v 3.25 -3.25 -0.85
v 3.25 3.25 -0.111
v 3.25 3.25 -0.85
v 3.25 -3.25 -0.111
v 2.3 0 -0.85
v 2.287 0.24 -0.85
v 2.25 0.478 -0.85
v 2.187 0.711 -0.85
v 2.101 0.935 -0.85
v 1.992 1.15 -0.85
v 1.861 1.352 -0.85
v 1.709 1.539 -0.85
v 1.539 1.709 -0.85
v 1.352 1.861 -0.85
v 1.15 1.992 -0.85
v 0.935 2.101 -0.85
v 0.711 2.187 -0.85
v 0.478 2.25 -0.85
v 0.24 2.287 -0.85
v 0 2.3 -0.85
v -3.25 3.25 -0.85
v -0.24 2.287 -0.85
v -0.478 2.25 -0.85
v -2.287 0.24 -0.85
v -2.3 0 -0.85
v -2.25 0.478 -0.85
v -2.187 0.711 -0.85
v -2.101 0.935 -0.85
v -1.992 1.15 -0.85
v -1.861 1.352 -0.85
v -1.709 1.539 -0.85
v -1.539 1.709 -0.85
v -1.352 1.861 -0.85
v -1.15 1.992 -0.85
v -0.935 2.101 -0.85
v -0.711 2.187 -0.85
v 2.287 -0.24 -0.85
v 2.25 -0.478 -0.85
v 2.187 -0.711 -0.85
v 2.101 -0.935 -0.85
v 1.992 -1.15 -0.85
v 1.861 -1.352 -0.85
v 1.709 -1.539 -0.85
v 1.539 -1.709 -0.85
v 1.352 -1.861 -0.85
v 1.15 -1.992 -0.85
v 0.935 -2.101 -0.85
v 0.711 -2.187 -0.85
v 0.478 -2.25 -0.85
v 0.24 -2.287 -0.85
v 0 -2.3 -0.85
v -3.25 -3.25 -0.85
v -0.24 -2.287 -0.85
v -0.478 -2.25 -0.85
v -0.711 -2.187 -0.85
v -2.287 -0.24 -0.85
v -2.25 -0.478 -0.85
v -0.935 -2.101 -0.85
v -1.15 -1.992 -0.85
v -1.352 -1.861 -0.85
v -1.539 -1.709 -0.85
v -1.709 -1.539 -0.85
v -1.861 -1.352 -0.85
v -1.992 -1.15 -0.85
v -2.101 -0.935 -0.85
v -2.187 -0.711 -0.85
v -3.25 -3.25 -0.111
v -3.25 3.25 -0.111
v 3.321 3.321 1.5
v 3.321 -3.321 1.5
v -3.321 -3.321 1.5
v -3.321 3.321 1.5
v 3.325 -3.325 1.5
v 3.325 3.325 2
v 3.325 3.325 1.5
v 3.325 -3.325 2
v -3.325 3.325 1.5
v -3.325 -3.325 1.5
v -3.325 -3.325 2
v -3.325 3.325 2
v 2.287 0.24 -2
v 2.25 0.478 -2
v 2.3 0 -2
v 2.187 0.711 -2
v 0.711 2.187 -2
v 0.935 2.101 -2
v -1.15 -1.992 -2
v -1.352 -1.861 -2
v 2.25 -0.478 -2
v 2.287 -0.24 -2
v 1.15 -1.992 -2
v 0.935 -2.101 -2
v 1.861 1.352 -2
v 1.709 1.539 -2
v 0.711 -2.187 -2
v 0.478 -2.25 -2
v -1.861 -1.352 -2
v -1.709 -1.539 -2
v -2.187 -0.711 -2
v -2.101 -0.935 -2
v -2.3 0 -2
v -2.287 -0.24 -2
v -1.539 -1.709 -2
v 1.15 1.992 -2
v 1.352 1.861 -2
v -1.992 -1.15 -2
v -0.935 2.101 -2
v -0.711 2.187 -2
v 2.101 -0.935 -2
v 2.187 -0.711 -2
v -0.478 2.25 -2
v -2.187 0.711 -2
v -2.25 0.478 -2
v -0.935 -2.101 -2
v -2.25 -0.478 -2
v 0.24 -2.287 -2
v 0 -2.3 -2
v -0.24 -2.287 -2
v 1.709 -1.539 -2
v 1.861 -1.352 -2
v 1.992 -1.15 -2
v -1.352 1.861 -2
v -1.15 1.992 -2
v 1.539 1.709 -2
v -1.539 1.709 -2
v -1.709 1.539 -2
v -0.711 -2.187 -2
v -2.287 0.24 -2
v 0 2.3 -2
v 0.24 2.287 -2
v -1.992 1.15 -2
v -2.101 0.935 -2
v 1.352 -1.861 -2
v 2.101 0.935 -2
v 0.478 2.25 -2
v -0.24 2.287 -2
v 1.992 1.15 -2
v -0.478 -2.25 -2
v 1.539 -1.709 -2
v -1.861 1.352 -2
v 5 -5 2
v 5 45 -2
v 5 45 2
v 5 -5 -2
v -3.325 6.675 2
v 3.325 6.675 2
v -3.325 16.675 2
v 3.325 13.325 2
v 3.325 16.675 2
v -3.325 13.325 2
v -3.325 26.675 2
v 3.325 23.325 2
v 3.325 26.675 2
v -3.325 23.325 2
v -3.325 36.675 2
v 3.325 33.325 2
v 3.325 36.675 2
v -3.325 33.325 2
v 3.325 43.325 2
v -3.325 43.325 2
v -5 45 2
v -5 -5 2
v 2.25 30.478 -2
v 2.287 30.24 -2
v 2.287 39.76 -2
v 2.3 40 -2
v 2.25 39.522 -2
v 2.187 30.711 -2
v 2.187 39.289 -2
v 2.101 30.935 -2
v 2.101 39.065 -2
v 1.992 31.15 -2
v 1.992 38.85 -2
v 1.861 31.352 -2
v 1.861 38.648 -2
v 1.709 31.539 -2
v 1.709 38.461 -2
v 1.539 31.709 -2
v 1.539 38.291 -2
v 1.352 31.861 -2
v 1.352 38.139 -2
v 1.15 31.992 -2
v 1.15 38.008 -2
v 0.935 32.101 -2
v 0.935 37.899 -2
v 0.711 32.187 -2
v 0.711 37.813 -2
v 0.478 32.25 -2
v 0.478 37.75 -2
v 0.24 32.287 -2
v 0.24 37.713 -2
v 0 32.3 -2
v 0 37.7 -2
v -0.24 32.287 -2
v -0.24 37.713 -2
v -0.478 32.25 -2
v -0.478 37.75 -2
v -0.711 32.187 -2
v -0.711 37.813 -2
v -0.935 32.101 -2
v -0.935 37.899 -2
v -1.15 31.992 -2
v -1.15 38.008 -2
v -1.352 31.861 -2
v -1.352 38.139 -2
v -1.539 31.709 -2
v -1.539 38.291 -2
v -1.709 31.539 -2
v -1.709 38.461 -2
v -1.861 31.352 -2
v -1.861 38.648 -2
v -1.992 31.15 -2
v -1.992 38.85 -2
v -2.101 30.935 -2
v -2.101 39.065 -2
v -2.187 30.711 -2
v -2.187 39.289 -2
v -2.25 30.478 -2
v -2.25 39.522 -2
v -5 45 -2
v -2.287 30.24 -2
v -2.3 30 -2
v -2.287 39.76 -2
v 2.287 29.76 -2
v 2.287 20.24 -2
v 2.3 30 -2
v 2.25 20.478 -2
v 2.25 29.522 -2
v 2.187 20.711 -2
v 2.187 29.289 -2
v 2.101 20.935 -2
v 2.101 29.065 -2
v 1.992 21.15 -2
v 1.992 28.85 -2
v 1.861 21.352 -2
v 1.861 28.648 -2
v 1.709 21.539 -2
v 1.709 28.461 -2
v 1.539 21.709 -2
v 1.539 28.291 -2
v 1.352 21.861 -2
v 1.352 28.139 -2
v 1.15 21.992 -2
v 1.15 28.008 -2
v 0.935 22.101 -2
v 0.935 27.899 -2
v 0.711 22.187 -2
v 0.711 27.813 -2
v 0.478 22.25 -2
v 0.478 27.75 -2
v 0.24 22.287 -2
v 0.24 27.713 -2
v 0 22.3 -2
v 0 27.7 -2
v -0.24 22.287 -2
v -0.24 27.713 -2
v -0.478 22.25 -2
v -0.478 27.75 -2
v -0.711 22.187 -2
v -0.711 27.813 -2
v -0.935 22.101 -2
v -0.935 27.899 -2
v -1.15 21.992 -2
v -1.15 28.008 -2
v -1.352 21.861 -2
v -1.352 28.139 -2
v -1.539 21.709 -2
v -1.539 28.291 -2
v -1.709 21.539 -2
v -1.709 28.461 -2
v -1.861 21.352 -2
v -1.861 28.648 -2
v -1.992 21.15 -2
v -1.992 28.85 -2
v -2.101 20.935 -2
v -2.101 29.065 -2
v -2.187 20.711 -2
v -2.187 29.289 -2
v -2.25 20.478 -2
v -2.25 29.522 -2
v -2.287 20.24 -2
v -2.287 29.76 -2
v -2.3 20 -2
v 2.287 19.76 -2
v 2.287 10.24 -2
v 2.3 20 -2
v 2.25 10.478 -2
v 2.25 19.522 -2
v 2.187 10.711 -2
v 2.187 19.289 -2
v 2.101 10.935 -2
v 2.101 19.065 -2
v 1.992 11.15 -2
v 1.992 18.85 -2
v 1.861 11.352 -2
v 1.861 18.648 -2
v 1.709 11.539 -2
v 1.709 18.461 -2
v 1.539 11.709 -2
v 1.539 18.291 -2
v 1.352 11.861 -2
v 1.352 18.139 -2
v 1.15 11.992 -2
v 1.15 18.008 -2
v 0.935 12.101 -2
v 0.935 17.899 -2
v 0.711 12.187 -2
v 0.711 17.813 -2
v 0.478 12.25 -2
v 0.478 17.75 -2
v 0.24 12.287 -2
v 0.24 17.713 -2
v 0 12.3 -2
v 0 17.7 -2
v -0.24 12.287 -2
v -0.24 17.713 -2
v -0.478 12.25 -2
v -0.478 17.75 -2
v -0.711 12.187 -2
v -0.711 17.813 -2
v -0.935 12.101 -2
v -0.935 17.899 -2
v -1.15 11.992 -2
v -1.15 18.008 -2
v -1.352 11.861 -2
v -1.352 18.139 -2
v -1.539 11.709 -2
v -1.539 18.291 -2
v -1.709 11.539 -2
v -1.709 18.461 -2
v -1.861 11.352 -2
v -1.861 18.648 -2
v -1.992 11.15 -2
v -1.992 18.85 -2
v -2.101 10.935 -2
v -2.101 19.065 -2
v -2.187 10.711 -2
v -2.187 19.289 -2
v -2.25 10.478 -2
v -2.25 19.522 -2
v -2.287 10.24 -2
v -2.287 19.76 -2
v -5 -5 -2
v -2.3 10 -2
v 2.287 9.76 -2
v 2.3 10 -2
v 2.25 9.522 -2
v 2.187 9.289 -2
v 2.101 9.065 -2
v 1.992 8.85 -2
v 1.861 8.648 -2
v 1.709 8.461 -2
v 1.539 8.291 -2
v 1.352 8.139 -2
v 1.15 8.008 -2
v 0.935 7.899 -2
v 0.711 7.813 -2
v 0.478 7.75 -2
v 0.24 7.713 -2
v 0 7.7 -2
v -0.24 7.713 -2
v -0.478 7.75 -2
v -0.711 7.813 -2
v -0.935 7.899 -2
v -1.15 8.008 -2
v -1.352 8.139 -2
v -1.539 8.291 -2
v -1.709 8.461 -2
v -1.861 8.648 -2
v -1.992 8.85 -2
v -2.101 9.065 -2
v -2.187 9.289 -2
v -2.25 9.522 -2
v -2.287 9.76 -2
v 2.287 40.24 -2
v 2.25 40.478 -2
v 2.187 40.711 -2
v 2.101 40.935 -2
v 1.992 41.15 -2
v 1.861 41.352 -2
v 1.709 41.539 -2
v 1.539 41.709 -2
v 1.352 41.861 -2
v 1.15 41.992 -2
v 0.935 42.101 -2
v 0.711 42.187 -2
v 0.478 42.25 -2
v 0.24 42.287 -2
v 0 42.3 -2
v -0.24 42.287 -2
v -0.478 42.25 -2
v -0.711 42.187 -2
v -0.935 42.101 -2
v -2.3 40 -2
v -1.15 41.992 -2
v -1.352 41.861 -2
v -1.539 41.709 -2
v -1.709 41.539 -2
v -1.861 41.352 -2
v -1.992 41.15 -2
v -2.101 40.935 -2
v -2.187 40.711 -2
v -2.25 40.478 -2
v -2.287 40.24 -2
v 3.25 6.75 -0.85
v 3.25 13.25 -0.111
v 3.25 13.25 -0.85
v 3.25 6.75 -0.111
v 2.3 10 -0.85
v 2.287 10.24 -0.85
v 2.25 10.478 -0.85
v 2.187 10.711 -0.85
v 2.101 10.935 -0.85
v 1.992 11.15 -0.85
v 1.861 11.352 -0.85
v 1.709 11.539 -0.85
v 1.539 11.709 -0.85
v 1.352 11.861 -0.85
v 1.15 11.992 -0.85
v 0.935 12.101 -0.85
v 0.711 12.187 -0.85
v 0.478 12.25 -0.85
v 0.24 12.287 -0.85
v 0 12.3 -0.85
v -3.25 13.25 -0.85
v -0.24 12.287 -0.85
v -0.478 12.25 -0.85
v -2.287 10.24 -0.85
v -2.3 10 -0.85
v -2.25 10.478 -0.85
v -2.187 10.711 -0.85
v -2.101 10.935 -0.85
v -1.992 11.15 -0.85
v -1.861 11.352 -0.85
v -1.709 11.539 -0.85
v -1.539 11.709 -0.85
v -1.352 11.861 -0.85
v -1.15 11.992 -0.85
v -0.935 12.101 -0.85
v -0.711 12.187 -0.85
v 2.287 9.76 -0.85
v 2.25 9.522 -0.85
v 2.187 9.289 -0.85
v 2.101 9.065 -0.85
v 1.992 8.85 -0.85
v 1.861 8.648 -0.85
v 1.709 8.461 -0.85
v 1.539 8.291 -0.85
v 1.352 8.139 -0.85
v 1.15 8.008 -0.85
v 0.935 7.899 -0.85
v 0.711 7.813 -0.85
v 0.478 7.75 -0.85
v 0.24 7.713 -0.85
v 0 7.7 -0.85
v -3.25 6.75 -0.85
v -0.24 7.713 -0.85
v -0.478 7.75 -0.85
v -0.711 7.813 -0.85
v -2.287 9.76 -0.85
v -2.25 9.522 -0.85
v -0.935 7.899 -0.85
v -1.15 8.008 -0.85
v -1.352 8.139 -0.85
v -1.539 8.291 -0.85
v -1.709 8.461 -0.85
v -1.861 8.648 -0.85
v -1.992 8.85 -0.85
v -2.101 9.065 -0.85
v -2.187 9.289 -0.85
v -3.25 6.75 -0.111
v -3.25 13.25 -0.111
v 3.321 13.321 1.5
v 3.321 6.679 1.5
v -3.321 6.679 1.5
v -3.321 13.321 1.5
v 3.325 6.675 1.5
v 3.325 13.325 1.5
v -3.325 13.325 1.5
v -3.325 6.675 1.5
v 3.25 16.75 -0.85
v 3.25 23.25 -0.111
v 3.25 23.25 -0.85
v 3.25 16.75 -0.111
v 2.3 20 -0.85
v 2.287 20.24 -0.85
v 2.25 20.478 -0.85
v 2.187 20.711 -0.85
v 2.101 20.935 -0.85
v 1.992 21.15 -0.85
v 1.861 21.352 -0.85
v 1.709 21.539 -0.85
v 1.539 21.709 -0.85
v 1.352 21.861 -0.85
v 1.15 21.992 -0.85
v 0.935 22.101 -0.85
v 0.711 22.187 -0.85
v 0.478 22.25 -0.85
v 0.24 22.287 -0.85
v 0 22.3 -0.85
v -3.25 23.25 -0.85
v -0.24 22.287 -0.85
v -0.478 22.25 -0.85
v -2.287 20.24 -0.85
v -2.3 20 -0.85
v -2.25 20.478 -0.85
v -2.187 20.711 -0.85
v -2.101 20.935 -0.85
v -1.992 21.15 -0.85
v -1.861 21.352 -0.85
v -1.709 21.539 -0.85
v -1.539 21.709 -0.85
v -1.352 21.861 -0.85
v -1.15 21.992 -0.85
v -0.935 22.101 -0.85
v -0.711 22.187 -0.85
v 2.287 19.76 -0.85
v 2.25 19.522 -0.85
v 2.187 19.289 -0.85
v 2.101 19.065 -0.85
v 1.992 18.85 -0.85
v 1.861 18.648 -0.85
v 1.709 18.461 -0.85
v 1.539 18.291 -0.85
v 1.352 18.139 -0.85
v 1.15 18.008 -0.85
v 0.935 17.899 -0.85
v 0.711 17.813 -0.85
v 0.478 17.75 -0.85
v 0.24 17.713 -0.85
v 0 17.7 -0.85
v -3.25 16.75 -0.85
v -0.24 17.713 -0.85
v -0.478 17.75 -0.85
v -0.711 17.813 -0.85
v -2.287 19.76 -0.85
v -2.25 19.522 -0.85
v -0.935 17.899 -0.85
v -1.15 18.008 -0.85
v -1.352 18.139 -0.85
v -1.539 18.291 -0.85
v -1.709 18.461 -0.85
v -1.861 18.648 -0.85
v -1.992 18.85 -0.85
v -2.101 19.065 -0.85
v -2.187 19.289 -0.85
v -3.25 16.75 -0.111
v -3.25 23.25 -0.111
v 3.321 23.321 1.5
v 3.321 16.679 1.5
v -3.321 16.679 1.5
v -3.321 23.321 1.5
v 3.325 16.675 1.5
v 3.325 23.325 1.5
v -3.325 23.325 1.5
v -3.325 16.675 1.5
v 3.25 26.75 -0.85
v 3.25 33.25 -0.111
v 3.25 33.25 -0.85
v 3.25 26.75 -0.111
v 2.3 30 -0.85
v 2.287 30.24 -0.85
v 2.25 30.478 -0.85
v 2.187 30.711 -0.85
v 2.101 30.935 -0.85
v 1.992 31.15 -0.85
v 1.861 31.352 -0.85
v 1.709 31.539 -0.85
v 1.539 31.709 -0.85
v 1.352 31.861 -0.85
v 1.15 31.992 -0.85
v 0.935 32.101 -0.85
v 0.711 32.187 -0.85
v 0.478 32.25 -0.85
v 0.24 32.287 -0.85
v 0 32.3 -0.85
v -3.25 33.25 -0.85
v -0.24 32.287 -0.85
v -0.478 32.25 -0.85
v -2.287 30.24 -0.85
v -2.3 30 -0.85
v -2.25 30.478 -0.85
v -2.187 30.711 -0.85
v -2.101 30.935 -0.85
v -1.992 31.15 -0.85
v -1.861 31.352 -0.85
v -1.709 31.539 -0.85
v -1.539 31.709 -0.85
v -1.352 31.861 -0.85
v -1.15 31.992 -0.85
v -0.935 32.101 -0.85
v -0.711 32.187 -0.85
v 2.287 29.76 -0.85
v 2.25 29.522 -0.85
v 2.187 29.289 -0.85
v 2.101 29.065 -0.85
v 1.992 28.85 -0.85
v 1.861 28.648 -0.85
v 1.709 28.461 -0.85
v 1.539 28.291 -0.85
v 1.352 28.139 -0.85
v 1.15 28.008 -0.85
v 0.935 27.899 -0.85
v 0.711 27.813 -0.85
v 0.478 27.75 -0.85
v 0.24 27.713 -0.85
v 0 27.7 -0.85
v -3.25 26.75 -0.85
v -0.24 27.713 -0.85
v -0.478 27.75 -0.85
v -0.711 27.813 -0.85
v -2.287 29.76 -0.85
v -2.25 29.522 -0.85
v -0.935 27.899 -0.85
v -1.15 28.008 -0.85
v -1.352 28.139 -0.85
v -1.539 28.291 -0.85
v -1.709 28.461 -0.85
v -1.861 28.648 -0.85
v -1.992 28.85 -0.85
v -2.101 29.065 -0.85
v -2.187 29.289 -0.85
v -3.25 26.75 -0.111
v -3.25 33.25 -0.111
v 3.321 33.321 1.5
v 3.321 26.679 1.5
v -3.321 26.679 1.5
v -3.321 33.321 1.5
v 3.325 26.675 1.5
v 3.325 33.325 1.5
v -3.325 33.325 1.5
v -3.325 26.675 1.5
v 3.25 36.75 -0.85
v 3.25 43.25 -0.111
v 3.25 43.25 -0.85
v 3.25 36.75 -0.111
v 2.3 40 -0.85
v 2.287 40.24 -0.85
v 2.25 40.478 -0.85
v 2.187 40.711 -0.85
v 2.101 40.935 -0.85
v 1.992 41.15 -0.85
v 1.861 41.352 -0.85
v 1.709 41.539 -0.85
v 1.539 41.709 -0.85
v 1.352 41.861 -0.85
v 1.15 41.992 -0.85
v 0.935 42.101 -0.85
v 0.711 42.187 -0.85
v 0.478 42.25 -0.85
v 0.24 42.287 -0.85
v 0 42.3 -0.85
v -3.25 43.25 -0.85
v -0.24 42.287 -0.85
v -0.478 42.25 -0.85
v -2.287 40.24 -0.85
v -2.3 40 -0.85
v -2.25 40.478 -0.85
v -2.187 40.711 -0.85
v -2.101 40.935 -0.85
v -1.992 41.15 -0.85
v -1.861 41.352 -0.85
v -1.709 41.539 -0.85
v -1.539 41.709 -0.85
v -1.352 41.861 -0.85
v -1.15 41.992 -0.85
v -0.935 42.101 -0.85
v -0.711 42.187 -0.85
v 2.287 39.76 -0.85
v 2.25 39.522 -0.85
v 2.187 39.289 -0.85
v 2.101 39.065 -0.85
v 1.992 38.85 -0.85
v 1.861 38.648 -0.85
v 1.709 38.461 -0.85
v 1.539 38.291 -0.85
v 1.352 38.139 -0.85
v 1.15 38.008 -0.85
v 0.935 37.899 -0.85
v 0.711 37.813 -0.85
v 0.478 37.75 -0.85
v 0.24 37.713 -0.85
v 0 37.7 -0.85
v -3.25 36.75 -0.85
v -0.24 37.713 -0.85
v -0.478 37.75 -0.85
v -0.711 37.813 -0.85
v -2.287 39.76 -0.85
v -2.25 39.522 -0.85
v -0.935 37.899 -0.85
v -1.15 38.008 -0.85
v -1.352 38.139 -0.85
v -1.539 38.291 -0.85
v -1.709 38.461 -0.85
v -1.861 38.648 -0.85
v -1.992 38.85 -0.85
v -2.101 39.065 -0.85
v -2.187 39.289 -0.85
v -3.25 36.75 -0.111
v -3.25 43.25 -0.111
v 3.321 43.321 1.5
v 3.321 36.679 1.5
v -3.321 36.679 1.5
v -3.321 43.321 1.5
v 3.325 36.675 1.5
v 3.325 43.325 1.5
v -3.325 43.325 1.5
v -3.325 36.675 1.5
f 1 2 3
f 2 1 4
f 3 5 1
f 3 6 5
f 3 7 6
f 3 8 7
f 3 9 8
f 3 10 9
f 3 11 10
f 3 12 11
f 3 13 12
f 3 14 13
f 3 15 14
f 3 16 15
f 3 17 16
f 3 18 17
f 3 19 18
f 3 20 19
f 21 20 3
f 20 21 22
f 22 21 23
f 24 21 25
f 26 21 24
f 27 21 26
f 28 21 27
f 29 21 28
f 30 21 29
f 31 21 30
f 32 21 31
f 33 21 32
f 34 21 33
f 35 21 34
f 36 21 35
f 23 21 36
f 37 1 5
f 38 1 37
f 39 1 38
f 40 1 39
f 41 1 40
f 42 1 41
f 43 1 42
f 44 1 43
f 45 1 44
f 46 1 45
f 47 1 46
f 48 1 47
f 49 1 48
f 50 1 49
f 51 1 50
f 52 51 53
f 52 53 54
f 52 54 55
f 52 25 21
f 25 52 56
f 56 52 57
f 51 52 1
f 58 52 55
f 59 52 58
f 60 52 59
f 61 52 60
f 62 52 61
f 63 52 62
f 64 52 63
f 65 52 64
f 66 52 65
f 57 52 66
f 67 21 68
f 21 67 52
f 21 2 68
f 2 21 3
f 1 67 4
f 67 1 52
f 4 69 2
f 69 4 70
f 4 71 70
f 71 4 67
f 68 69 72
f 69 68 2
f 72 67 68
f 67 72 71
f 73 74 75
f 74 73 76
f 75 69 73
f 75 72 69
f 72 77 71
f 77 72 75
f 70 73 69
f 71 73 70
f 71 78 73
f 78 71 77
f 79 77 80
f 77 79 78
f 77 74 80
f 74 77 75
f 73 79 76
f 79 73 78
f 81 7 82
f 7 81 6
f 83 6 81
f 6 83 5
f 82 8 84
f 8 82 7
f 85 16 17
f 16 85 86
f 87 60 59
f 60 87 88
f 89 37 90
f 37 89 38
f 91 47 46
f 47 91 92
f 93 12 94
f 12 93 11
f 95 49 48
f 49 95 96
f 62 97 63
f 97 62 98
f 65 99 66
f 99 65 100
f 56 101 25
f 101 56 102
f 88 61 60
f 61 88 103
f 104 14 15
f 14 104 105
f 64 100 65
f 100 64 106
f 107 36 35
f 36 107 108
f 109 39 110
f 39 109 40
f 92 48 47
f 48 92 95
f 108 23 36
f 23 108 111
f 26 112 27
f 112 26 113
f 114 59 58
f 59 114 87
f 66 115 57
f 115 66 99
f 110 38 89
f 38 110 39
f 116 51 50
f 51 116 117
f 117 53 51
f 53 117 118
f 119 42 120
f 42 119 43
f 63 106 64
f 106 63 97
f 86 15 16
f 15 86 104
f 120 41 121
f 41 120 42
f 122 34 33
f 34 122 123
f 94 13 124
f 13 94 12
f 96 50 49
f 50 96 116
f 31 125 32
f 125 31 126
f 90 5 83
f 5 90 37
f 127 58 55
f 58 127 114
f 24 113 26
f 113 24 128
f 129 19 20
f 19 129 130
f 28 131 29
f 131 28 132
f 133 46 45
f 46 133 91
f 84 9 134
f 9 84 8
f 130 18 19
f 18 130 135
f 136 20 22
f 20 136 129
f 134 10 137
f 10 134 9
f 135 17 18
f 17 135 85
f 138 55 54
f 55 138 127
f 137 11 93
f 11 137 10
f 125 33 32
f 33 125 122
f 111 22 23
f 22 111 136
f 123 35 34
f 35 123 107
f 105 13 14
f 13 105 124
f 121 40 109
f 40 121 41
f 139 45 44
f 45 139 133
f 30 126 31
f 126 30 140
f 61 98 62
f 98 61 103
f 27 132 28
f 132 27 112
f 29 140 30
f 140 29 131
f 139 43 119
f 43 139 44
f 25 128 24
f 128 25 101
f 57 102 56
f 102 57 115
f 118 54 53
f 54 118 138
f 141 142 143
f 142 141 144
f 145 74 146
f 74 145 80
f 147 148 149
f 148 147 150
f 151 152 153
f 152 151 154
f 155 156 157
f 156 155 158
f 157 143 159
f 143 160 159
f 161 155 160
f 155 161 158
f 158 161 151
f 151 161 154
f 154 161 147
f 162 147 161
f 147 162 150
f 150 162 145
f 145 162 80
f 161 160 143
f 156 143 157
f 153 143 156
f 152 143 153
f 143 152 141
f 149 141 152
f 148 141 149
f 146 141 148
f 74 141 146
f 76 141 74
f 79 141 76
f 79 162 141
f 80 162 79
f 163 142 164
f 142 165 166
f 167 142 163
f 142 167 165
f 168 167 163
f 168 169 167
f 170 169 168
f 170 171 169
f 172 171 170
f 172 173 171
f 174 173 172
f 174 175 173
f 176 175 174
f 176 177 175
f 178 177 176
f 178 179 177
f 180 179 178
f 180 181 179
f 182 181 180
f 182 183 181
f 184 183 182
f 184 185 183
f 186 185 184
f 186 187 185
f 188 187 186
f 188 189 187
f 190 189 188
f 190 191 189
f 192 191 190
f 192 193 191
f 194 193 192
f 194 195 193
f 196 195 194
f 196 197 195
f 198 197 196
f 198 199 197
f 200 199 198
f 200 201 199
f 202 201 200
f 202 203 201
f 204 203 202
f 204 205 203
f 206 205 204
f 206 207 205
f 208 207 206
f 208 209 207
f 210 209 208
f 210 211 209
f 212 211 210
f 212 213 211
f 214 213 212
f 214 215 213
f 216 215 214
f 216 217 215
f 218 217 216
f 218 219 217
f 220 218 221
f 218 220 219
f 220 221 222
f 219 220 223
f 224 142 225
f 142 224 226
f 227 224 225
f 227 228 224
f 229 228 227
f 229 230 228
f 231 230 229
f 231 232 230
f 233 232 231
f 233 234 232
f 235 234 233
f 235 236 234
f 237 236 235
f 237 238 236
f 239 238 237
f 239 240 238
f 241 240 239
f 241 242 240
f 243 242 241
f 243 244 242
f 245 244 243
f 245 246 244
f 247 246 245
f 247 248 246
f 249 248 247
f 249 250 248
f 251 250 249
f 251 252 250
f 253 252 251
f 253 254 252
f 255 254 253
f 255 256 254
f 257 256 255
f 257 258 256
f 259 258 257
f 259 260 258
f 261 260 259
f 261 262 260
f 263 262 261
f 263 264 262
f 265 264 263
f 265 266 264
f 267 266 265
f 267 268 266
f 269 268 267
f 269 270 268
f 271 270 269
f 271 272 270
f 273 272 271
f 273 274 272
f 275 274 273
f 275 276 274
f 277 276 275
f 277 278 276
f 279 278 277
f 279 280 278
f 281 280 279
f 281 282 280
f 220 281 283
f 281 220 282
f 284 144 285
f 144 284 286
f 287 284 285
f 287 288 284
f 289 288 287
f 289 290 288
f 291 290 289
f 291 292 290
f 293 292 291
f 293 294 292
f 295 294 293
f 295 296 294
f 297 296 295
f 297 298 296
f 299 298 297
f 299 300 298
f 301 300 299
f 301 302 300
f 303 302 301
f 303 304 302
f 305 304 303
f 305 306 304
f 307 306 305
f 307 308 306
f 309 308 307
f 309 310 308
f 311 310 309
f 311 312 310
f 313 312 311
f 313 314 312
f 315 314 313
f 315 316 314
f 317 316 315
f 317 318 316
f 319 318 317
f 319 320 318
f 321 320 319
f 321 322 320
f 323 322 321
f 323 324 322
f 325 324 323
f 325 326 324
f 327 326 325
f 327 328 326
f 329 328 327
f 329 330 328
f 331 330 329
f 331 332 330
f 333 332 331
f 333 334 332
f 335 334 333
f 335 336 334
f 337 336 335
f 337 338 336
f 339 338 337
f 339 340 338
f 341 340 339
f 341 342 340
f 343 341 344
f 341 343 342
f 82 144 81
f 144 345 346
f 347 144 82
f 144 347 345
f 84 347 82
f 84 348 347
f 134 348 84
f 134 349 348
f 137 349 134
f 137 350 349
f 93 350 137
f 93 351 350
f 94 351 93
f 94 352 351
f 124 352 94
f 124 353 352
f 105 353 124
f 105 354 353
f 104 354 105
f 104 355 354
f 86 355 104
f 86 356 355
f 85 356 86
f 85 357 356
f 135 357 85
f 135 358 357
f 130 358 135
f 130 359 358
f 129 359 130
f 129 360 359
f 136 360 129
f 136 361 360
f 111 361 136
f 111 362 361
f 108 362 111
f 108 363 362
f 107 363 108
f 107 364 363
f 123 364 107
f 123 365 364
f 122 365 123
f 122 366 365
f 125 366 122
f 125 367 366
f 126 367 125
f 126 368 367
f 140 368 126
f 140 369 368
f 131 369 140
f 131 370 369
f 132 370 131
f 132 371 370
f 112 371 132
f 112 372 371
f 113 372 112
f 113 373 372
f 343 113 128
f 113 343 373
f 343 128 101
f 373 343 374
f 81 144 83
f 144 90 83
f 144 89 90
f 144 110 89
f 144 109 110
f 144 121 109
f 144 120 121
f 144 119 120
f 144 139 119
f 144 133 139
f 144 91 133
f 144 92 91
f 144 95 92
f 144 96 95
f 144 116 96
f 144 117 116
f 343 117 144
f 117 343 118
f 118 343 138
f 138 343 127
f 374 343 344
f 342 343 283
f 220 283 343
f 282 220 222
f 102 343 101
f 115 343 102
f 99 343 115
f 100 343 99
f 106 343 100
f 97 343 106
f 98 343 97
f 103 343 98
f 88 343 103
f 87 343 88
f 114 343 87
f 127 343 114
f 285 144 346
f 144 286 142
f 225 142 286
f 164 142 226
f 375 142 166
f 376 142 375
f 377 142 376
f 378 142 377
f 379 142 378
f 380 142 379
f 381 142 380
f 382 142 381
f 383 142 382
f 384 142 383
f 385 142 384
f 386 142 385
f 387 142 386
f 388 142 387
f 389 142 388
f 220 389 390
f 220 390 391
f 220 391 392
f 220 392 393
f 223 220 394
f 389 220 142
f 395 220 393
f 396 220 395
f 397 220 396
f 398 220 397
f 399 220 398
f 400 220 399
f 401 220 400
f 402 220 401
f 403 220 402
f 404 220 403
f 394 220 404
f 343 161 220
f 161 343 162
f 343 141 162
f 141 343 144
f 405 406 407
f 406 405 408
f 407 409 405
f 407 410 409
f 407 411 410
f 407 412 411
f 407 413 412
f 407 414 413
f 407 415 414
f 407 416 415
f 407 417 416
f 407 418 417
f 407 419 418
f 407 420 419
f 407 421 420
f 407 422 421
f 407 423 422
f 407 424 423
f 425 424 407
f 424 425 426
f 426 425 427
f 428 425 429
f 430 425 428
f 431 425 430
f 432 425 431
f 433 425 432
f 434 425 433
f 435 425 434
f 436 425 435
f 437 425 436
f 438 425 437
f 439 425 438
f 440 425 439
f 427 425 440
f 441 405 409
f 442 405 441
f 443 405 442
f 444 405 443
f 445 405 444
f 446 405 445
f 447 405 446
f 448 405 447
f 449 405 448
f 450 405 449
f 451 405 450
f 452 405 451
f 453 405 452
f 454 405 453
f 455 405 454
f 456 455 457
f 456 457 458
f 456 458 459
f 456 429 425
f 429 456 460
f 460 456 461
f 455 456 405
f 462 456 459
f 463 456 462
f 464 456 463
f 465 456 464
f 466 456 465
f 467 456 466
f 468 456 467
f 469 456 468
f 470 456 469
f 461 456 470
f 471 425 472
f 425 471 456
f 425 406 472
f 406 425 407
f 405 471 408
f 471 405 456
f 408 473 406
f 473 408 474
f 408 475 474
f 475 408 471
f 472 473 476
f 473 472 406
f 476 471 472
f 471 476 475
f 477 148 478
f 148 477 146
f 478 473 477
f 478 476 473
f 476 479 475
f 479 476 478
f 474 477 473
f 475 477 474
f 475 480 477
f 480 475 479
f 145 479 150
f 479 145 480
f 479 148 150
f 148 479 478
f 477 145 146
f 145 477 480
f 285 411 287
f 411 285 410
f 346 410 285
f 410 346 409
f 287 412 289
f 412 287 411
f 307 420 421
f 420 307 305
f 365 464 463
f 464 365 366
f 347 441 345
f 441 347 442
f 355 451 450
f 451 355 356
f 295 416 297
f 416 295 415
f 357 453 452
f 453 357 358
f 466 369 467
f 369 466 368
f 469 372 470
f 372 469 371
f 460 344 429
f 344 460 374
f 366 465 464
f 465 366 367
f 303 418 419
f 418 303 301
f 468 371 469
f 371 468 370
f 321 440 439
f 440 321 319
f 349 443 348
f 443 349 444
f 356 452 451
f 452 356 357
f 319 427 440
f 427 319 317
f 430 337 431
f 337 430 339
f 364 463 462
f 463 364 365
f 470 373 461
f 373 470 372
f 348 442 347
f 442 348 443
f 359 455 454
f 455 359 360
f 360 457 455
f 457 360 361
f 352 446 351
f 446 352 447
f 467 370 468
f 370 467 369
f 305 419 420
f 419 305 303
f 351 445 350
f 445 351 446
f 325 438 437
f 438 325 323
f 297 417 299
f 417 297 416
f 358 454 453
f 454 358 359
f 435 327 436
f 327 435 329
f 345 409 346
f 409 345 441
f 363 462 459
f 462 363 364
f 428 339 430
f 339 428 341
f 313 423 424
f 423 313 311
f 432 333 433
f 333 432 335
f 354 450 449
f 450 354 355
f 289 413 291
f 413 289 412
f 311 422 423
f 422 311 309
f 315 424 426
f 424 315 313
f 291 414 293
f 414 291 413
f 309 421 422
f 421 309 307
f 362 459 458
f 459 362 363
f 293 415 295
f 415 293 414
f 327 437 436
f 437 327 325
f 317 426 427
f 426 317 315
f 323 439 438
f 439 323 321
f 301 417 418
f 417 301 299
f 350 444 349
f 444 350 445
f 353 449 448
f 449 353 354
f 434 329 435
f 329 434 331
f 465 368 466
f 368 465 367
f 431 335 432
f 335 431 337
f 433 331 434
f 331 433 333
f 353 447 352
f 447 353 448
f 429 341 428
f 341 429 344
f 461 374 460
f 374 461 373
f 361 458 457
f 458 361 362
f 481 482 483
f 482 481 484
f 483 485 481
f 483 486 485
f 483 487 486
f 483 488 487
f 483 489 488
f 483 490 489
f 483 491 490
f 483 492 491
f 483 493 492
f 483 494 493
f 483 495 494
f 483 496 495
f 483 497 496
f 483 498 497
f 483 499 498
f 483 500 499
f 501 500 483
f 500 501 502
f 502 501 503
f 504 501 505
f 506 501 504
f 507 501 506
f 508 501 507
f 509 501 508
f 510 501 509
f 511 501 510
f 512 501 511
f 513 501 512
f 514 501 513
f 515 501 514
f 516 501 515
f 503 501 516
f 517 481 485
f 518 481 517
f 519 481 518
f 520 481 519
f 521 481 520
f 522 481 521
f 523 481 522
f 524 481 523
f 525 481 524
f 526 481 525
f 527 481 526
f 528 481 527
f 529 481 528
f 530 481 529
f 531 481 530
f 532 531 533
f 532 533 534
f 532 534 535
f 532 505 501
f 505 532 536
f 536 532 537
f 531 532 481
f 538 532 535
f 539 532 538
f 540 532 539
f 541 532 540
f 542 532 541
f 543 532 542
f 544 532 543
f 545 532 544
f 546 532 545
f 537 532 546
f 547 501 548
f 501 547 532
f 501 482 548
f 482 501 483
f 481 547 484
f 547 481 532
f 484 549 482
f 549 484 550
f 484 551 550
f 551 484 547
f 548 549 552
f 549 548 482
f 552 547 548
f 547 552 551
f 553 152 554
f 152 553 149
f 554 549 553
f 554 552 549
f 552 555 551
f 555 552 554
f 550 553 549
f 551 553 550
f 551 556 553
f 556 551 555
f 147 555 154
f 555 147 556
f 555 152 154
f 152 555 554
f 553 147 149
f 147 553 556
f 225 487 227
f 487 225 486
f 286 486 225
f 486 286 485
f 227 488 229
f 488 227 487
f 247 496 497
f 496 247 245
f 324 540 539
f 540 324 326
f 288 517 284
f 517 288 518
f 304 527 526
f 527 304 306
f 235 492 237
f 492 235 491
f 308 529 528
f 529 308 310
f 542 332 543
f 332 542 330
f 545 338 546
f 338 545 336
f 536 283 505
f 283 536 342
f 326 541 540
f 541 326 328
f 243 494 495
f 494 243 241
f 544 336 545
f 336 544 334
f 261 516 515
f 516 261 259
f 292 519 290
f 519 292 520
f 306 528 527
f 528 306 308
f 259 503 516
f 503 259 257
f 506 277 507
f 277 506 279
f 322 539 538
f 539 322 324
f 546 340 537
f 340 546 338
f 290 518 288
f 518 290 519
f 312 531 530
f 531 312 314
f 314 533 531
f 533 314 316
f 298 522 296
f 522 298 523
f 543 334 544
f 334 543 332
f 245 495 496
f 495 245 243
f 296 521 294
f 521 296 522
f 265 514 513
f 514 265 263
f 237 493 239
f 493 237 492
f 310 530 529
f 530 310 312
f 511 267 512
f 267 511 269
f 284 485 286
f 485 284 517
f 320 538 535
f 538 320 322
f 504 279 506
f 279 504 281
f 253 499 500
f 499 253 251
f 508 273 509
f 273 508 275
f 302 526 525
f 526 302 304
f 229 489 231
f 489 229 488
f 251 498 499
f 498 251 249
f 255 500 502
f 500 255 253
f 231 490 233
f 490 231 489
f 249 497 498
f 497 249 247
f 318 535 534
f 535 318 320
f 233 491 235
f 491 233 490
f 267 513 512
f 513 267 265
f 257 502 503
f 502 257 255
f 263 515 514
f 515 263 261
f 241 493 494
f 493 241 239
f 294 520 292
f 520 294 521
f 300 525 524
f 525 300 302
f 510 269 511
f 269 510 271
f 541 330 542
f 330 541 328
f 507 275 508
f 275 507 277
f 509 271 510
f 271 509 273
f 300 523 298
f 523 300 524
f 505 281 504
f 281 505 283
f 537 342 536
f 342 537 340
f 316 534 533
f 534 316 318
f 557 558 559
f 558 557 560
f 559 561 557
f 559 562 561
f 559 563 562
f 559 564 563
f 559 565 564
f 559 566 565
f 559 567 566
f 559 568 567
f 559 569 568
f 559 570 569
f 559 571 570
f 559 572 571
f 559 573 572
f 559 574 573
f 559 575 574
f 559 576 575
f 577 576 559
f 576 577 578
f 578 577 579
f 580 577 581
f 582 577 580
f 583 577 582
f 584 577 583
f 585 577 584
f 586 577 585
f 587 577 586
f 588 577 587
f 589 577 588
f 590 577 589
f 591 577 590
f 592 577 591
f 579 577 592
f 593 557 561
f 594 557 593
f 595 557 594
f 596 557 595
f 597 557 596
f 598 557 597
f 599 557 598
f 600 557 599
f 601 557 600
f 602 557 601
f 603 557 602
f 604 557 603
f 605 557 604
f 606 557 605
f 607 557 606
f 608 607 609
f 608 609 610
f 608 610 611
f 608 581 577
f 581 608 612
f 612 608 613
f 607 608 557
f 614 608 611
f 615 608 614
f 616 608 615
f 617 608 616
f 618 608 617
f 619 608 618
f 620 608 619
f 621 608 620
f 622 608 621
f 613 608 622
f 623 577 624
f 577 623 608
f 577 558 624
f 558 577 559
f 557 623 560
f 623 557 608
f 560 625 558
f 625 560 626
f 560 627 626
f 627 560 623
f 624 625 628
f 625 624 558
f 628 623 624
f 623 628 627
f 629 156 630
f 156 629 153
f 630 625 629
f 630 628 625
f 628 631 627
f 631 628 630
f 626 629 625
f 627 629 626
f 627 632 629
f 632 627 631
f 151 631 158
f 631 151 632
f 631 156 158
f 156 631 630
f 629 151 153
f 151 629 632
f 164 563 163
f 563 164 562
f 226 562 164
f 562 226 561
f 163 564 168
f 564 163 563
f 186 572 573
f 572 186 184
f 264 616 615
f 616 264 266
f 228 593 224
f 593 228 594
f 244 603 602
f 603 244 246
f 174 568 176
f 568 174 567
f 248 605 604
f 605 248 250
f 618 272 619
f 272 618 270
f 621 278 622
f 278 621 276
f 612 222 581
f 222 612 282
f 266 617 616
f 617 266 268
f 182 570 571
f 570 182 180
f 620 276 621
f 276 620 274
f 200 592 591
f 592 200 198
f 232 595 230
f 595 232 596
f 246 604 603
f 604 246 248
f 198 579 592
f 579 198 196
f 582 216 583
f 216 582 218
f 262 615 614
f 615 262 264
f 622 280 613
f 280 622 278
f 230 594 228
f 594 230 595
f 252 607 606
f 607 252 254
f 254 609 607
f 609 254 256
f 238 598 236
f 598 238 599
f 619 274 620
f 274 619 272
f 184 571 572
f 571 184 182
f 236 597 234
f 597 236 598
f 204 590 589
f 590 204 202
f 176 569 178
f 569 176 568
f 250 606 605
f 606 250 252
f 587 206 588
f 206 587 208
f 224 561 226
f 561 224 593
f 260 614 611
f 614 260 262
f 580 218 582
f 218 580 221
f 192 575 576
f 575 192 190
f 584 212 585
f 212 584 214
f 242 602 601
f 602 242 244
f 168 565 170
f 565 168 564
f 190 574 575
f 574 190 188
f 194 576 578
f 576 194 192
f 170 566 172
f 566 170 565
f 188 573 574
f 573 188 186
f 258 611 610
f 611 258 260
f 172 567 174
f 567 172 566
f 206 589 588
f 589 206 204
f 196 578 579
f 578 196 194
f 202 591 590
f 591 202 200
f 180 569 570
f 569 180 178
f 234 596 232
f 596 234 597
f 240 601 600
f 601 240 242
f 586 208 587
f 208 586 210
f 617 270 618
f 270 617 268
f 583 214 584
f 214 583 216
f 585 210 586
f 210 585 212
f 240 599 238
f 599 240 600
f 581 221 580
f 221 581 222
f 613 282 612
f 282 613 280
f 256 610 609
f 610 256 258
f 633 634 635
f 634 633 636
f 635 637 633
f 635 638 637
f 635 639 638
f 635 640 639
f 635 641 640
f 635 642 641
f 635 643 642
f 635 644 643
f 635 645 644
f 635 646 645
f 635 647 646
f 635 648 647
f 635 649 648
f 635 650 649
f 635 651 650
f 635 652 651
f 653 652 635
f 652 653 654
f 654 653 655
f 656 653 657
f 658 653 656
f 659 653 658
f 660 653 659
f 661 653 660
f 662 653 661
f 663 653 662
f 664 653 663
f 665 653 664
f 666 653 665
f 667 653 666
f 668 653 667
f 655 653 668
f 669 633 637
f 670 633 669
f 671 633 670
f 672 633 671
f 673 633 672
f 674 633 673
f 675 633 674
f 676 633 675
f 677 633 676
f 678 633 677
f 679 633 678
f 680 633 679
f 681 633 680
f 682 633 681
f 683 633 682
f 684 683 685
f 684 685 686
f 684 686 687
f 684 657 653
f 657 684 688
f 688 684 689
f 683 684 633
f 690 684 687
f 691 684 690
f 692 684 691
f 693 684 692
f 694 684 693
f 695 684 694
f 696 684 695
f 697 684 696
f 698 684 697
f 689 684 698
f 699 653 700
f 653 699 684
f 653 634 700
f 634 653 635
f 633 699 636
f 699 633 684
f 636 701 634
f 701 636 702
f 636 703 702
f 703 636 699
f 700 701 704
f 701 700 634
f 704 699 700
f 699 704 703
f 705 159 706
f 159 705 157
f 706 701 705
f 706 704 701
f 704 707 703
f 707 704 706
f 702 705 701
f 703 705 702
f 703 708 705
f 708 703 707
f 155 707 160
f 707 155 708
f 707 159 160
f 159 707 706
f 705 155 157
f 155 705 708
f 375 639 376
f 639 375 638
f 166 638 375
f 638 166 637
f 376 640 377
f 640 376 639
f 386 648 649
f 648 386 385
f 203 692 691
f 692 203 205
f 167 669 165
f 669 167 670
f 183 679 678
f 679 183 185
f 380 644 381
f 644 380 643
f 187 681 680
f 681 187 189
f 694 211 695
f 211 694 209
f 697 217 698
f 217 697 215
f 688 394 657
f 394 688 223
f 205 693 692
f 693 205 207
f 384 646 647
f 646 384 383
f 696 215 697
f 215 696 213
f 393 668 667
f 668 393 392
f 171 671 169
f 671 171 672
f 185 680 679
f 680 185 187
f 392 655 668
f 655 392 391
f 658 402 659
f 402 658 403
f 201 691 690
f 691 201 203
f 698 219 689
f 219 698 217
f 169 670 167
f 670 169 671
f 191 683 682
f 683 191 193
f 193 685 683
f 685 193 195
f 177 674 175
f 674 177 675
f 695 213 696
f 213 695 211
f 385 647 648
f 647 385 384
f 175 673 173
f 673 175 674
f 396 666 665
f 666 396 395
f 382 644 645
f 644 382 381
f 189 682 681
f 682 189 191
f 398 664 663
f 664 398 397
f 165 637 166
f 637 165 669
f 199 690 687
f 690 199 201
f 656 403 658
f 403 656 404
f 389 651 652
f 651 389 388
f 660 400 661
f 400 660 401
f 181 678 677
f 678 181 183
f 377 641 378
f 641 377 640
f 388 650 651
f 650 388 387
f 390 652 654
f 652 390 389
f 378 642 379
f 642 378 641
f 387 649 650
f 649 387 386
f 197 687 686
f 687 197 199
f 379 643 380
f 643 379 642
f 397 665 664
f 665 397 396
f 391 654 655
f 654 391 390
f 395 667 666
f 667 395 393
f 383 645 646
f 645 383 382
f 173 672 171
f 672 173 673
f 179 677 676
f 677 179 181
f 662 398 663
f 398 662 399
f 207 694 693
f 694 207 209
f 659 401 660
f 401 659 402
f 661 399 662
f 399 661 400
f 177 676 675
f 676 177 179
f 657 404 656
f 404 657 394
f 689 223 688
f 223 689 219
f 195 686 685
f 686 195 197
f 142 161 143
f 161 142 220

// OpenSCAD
thickness = 4.0;

// http://rcpp-kvalitet.ru/catalog/
// http://tdm-neva.ru/nuts/din-562-nut.htm
// http://www.ebay.com/itm/172788788738
//у винтов М4
//внешний диаметр шляпки 6.5..7 мм
//внешний диаметр резьбы 3.8 мм
module m4_square_nut_shell(){
    translate([0,0,1.1])cube([6.65,6.65,1.2], center=true);
}

module m4_square_nut_shell_inflated(){
    translate([0,0,0.1]) cube ([6.5,6.5,2.4], center=true);
    translate([0,0,-1.1]) rotate([0,0,45]) cylinder(h=2.4, r1=4.55, r2=4.7, $fn=4);
}

module m4_square_nut(){
    difference(){
        m4_square_nut_shell();
        cylinder(r=2, h=3, center=true);
    }
}

module node(width) {
    difference(){
        cube([width, width, thickness], center=true);
        union(){
            translate([0,0,0.25]) m4_square_nut_shell_inflated();
            translate([0,0,1]) m4_square_nut_shell();        cylinder(r=2.3, h=8, center=true, $fn=60);
        }
    }
}

module node_cut(){
    intersection(){
        node(10);
        translate([-20,0,0]) cube([40,40,40], center=true);
    }
}

module contact_node()
{
    union(){
        node(10);
        difference(){
            translate([0,0,-5]) cube([10,10,6], center=true);
            union(){
                #translate([0,0,-8.5]) cylinder(r=3.5, h=7, $fn=32);
            }
        }
    }
}

module contact_node_cut(){
    intersection(){
        contact_node(10);
        translate([-20,0,0]) cube([40,40,40], center=true);
    }
}

module rectangular_bar(count_x, width){
     for (i = [0:1:(count_x-1)] )
     {
         translate([0,i*width,0])node(width);
     }
}

module rectangular_bar_alternating11_0(count_x, width){
     for (i = [0:1:(count_x-1)] )
     {
         if (i%2) mirror([0,0,1]) translate([0,i*width,0])node(width);
         else  translate([0,i*width,0])node(width);
     }
}

module rectangular_bar_alternating11_1(count_x, width){
    for (i = [0:1:(count_x-1)] )
    {
        if (i%2) translate([0,i*width,0])node(width);
        else  mirror([0,0,1]) translate([0,i*width,0])node(width);
    }
}

module rectangular_plate(count_x, count_y, width){
     for (i = [0:1:(count_x-1)] )
     for (j = [0:1:(count_y-1)] )
     {
         translate([i*width,j*width,0])node(width);
     }
}

module electric_board(count_x, count_y){
     for (i = [0:1:(count_x-1)] )
     for (j = [0:1:(count_y-1)] )
     {
         translate([i*10,j*10,0])contact_node(width);
     }
}

module bracket1(count_x, count_y, count_z, width)
{
    union(){
        rectangular_plate(count_x, count_y, width);
        translate([(count_x-0.5)*width, 0, 0.5*width]) rotate([0,-90,0]) rectangular_plate(count_z, count_y, width);
        translate([(count_x-0.25)*width-0.5, -0.5*width, -0.25*width+0.5]) rotate([0,-90,0]) cube([width/4, width*count_y, width/4]);
        translate([-0.5*width, 0, (count_z-0.5)*width]) rotate([0,90,0])rectangular_plate(count_z, count_y, width);
        translate([-0.5*width+0.5, -0.5*width, -0.25*width+0.5]) rotate([0,-90,0]) cube([width/4, width*count_y, width/4]);
    }
}

module bracket2(count_x, count_y, count_z, width)
{
    union(){
        mirror([0,0,1]) rectangular_plate(count_x, count_y, width);
        translate([(count_x-0.5)*width, 0, 0.5*width]) rotate([0,-90,0]) rectangular_plate(count_z, count_y, width);
        translate([(count_x-0.25)*width-0.5, -0.5*width, -0.25*width+0.5]) rotate([0,-90,0]) cube([width/4, width*count_y, width/4]);
        translate([-0.5*width, 0, (count_z-0.5)*width]) rotate([0,90,0])rectangular_plate(count_z, count_y, width);
        translate([-0.5*width+0.5, -0.5*width, -0.25*width+0.5]) rotate([0,-90,0]) cube([width/4, width*count_y, width/4]);
    }
}

/*
module half_barrel1(height, r)
{
    for (i = [0:1:(height-1)] )
    {
        step = 3.14 * r / 10;
        for (alpha = [0:step:3.14]) {
            alpha_deg = aplpha * 180 / 3.14;
            rotate([0,0,alpha_deg]) translate([0,r,10*i]) rotate([90,0,0]) node(10);
        }
    }    
}
*/

/*
module bracket3(count_x, count_y, count_z, width)
{
    difference(){
        union(){
            mirror([0,0,1]) rectangular_plate(count_x, count_y, width);
            translate([(count_x-0.5)*width, 0, 0.5*width]) rotate([0,-90,0]) mirror([0,0,1]) rectangular_plate(count_z, count_y, width);
            translate([(count_x-0.25)*width-0.5, -0.5*width, -0.25*width+0.5]) rotate([0,-90,0]) cube([width/4, width*count_y, width/4]);
            translate([-0.5*width, 0, (count_z-0.5)*width]) rotate([0,90,0]) mirror([0,0,1]) rectangular_plate(count_z, count_y, width);
            translate([-0.5*width+0.5, -0.5*width, -0.25*width+0.5]) rotate([0,-90,0]) cube([width/4, width*count_y, width/4]);
        }
        
        union(){
            for (i = [0:1:(count_y-1)] ) {
                translate ([-width/2, width*i ,width/2]) rotate([0,90,0]) m4_square_nut_shell_inflated();
            }
            for (i = [0:1:(count_y-1)] ) {
                translate ([(count_x-0.5)*width, width*i ,width/2]) rotate([0,90,0]) m4_square_nut_shell_inflated();
            }
        }
    }
}
*/

/*
module bracket3(count_x, count_y, count_z, width)
{
    union(){
        mirror([0,0,1]) rectangular_plate(count_x, count_y, width);
        translate([(count_x-0.5)*width, 0, 0.5*width]) rotate([0,-90,0]) mirror([0,0,1]) rectangular_plate(count_z, count_y, width);
        translate([(count_x-0.25)*width-0.5, -0.5*width, -0.25*width+0.5]) rotate([0,-90,0]) cube([width/4, width*count_y, width/4]);
        translate([-0.5*width, 0, (count_z-0.5)*width]) rotate([0,90,0]) mirror([0,0,1]) rectangular_plate(count_z, count_y, width);
        translate([-0.5*width+0.5, -0.5*width, -0.25*width+0.5]) rotate([0,-90,0]) cube([width/4, width*count_y, width/4]);
    }
}
*/

module bracket3(count_x, count_y, count_z, width)
{
    difference(){
        union(){
            mirror([0,0,1]) rectangular_plate(count_x, count_y, width);
            translate([(count_x-0.5)*width, 0, 0.5*width]) rotate([0,-90,0]) mirror([0,0,1]) rectangular_plate(count_z, count_y, width);
            translate([(count_x-0.25)*width-0.5, -0.5*width, -0.25*width+0.5]) rotate([0,-90,0]) cube([width/4, width*count_y, width/4]);
            translate([-0.5*width, 0, (count_z-0.5)*width]) rotate([0,90,0]) mirror([0,0,1]) rectangular_plate(count_z, count_y, width);
            translate([-0.5*width+0.5, -0.5*width, -0.25*width+0.5]) rotate([0,-90,0]) cube([width/4, width*count_y, width/4]);
        }
        
        union(){
            for (i = [0:1:(count_y-1)] ) {
                translate ([-width/2, width*i ,width/2]) rotate([0,90,0]) m4_square_nut_shell_inflated();
            }
            for (i = [0:1:(count_y-1)] ) {
                translate ([(count_x-0.5)*width, width*i ,width/2]) rotate([0,90,0]) m4_square_nut_shell_inflated();
            }
        }
    }
}

module bracket4(count_x, count_y, count_z, width)
{
    difference(){
        union(){
            rectangular_plate(count_x, count_y, width);
            translate([(count_x-0.5)*width, 0, 0.5*width]) rotate([0,-90,0]) mirror([0,0,1]) rectangular_plate(count_z, count_y, width);
            translate([(count_x-0.25)*width-0.5, -0.5*width, -0.25*width+0.5]) rotate([0,-90,0]) cube([width/4, width*count_y, width/4]);
            translate([-0.5*width, 0, (count_z-0.5)*width]) rotate([0,90,0]) mirror([0,0,1]) rectangular_plate(count_z, count_y, width);
            translate([-0.5*width+0.5, -0.5*width, -0.25*width+0.5]) rotate([0,-90,0]) cube([width/4, width*count_y, width/4]);
        }
        
        union(){
            for (i = [0:1:(count_y-1)] ) {
                translate ([-width/2, width*i ,width/2]) rotate([0,90,0]) m4_square_nut_shell_inflated();
            }
            for (i = [0:1:(count_y-1)] ) {
                translate ([(count_x-0.5)*width, width*i ,width/2]) rotate([0,90,0]) m4_square_nut_shell_inflated();
            }
        }
    }
}
/*
module corner_in_in(count_x, count_y, count_z, width){
     for (k = [0:1:(count_z-1)])
     {
         translate()    
     }
}
*/

//contact_node_cut();
//electric_board(5,5);
//rectangular_bar_alternating11_0(19, 10);
//translate([20,0,0]) rectangular_bar_alternating11_1(19, 10);
//node(10);
rectangular_plate(1,5,10);
//half_barrel1(4, 20);
//translate ([-40,0,0]) mirror([0,0,1]) rectangular_plate(3,4,10);
//bracket4(5,8,2,10);
